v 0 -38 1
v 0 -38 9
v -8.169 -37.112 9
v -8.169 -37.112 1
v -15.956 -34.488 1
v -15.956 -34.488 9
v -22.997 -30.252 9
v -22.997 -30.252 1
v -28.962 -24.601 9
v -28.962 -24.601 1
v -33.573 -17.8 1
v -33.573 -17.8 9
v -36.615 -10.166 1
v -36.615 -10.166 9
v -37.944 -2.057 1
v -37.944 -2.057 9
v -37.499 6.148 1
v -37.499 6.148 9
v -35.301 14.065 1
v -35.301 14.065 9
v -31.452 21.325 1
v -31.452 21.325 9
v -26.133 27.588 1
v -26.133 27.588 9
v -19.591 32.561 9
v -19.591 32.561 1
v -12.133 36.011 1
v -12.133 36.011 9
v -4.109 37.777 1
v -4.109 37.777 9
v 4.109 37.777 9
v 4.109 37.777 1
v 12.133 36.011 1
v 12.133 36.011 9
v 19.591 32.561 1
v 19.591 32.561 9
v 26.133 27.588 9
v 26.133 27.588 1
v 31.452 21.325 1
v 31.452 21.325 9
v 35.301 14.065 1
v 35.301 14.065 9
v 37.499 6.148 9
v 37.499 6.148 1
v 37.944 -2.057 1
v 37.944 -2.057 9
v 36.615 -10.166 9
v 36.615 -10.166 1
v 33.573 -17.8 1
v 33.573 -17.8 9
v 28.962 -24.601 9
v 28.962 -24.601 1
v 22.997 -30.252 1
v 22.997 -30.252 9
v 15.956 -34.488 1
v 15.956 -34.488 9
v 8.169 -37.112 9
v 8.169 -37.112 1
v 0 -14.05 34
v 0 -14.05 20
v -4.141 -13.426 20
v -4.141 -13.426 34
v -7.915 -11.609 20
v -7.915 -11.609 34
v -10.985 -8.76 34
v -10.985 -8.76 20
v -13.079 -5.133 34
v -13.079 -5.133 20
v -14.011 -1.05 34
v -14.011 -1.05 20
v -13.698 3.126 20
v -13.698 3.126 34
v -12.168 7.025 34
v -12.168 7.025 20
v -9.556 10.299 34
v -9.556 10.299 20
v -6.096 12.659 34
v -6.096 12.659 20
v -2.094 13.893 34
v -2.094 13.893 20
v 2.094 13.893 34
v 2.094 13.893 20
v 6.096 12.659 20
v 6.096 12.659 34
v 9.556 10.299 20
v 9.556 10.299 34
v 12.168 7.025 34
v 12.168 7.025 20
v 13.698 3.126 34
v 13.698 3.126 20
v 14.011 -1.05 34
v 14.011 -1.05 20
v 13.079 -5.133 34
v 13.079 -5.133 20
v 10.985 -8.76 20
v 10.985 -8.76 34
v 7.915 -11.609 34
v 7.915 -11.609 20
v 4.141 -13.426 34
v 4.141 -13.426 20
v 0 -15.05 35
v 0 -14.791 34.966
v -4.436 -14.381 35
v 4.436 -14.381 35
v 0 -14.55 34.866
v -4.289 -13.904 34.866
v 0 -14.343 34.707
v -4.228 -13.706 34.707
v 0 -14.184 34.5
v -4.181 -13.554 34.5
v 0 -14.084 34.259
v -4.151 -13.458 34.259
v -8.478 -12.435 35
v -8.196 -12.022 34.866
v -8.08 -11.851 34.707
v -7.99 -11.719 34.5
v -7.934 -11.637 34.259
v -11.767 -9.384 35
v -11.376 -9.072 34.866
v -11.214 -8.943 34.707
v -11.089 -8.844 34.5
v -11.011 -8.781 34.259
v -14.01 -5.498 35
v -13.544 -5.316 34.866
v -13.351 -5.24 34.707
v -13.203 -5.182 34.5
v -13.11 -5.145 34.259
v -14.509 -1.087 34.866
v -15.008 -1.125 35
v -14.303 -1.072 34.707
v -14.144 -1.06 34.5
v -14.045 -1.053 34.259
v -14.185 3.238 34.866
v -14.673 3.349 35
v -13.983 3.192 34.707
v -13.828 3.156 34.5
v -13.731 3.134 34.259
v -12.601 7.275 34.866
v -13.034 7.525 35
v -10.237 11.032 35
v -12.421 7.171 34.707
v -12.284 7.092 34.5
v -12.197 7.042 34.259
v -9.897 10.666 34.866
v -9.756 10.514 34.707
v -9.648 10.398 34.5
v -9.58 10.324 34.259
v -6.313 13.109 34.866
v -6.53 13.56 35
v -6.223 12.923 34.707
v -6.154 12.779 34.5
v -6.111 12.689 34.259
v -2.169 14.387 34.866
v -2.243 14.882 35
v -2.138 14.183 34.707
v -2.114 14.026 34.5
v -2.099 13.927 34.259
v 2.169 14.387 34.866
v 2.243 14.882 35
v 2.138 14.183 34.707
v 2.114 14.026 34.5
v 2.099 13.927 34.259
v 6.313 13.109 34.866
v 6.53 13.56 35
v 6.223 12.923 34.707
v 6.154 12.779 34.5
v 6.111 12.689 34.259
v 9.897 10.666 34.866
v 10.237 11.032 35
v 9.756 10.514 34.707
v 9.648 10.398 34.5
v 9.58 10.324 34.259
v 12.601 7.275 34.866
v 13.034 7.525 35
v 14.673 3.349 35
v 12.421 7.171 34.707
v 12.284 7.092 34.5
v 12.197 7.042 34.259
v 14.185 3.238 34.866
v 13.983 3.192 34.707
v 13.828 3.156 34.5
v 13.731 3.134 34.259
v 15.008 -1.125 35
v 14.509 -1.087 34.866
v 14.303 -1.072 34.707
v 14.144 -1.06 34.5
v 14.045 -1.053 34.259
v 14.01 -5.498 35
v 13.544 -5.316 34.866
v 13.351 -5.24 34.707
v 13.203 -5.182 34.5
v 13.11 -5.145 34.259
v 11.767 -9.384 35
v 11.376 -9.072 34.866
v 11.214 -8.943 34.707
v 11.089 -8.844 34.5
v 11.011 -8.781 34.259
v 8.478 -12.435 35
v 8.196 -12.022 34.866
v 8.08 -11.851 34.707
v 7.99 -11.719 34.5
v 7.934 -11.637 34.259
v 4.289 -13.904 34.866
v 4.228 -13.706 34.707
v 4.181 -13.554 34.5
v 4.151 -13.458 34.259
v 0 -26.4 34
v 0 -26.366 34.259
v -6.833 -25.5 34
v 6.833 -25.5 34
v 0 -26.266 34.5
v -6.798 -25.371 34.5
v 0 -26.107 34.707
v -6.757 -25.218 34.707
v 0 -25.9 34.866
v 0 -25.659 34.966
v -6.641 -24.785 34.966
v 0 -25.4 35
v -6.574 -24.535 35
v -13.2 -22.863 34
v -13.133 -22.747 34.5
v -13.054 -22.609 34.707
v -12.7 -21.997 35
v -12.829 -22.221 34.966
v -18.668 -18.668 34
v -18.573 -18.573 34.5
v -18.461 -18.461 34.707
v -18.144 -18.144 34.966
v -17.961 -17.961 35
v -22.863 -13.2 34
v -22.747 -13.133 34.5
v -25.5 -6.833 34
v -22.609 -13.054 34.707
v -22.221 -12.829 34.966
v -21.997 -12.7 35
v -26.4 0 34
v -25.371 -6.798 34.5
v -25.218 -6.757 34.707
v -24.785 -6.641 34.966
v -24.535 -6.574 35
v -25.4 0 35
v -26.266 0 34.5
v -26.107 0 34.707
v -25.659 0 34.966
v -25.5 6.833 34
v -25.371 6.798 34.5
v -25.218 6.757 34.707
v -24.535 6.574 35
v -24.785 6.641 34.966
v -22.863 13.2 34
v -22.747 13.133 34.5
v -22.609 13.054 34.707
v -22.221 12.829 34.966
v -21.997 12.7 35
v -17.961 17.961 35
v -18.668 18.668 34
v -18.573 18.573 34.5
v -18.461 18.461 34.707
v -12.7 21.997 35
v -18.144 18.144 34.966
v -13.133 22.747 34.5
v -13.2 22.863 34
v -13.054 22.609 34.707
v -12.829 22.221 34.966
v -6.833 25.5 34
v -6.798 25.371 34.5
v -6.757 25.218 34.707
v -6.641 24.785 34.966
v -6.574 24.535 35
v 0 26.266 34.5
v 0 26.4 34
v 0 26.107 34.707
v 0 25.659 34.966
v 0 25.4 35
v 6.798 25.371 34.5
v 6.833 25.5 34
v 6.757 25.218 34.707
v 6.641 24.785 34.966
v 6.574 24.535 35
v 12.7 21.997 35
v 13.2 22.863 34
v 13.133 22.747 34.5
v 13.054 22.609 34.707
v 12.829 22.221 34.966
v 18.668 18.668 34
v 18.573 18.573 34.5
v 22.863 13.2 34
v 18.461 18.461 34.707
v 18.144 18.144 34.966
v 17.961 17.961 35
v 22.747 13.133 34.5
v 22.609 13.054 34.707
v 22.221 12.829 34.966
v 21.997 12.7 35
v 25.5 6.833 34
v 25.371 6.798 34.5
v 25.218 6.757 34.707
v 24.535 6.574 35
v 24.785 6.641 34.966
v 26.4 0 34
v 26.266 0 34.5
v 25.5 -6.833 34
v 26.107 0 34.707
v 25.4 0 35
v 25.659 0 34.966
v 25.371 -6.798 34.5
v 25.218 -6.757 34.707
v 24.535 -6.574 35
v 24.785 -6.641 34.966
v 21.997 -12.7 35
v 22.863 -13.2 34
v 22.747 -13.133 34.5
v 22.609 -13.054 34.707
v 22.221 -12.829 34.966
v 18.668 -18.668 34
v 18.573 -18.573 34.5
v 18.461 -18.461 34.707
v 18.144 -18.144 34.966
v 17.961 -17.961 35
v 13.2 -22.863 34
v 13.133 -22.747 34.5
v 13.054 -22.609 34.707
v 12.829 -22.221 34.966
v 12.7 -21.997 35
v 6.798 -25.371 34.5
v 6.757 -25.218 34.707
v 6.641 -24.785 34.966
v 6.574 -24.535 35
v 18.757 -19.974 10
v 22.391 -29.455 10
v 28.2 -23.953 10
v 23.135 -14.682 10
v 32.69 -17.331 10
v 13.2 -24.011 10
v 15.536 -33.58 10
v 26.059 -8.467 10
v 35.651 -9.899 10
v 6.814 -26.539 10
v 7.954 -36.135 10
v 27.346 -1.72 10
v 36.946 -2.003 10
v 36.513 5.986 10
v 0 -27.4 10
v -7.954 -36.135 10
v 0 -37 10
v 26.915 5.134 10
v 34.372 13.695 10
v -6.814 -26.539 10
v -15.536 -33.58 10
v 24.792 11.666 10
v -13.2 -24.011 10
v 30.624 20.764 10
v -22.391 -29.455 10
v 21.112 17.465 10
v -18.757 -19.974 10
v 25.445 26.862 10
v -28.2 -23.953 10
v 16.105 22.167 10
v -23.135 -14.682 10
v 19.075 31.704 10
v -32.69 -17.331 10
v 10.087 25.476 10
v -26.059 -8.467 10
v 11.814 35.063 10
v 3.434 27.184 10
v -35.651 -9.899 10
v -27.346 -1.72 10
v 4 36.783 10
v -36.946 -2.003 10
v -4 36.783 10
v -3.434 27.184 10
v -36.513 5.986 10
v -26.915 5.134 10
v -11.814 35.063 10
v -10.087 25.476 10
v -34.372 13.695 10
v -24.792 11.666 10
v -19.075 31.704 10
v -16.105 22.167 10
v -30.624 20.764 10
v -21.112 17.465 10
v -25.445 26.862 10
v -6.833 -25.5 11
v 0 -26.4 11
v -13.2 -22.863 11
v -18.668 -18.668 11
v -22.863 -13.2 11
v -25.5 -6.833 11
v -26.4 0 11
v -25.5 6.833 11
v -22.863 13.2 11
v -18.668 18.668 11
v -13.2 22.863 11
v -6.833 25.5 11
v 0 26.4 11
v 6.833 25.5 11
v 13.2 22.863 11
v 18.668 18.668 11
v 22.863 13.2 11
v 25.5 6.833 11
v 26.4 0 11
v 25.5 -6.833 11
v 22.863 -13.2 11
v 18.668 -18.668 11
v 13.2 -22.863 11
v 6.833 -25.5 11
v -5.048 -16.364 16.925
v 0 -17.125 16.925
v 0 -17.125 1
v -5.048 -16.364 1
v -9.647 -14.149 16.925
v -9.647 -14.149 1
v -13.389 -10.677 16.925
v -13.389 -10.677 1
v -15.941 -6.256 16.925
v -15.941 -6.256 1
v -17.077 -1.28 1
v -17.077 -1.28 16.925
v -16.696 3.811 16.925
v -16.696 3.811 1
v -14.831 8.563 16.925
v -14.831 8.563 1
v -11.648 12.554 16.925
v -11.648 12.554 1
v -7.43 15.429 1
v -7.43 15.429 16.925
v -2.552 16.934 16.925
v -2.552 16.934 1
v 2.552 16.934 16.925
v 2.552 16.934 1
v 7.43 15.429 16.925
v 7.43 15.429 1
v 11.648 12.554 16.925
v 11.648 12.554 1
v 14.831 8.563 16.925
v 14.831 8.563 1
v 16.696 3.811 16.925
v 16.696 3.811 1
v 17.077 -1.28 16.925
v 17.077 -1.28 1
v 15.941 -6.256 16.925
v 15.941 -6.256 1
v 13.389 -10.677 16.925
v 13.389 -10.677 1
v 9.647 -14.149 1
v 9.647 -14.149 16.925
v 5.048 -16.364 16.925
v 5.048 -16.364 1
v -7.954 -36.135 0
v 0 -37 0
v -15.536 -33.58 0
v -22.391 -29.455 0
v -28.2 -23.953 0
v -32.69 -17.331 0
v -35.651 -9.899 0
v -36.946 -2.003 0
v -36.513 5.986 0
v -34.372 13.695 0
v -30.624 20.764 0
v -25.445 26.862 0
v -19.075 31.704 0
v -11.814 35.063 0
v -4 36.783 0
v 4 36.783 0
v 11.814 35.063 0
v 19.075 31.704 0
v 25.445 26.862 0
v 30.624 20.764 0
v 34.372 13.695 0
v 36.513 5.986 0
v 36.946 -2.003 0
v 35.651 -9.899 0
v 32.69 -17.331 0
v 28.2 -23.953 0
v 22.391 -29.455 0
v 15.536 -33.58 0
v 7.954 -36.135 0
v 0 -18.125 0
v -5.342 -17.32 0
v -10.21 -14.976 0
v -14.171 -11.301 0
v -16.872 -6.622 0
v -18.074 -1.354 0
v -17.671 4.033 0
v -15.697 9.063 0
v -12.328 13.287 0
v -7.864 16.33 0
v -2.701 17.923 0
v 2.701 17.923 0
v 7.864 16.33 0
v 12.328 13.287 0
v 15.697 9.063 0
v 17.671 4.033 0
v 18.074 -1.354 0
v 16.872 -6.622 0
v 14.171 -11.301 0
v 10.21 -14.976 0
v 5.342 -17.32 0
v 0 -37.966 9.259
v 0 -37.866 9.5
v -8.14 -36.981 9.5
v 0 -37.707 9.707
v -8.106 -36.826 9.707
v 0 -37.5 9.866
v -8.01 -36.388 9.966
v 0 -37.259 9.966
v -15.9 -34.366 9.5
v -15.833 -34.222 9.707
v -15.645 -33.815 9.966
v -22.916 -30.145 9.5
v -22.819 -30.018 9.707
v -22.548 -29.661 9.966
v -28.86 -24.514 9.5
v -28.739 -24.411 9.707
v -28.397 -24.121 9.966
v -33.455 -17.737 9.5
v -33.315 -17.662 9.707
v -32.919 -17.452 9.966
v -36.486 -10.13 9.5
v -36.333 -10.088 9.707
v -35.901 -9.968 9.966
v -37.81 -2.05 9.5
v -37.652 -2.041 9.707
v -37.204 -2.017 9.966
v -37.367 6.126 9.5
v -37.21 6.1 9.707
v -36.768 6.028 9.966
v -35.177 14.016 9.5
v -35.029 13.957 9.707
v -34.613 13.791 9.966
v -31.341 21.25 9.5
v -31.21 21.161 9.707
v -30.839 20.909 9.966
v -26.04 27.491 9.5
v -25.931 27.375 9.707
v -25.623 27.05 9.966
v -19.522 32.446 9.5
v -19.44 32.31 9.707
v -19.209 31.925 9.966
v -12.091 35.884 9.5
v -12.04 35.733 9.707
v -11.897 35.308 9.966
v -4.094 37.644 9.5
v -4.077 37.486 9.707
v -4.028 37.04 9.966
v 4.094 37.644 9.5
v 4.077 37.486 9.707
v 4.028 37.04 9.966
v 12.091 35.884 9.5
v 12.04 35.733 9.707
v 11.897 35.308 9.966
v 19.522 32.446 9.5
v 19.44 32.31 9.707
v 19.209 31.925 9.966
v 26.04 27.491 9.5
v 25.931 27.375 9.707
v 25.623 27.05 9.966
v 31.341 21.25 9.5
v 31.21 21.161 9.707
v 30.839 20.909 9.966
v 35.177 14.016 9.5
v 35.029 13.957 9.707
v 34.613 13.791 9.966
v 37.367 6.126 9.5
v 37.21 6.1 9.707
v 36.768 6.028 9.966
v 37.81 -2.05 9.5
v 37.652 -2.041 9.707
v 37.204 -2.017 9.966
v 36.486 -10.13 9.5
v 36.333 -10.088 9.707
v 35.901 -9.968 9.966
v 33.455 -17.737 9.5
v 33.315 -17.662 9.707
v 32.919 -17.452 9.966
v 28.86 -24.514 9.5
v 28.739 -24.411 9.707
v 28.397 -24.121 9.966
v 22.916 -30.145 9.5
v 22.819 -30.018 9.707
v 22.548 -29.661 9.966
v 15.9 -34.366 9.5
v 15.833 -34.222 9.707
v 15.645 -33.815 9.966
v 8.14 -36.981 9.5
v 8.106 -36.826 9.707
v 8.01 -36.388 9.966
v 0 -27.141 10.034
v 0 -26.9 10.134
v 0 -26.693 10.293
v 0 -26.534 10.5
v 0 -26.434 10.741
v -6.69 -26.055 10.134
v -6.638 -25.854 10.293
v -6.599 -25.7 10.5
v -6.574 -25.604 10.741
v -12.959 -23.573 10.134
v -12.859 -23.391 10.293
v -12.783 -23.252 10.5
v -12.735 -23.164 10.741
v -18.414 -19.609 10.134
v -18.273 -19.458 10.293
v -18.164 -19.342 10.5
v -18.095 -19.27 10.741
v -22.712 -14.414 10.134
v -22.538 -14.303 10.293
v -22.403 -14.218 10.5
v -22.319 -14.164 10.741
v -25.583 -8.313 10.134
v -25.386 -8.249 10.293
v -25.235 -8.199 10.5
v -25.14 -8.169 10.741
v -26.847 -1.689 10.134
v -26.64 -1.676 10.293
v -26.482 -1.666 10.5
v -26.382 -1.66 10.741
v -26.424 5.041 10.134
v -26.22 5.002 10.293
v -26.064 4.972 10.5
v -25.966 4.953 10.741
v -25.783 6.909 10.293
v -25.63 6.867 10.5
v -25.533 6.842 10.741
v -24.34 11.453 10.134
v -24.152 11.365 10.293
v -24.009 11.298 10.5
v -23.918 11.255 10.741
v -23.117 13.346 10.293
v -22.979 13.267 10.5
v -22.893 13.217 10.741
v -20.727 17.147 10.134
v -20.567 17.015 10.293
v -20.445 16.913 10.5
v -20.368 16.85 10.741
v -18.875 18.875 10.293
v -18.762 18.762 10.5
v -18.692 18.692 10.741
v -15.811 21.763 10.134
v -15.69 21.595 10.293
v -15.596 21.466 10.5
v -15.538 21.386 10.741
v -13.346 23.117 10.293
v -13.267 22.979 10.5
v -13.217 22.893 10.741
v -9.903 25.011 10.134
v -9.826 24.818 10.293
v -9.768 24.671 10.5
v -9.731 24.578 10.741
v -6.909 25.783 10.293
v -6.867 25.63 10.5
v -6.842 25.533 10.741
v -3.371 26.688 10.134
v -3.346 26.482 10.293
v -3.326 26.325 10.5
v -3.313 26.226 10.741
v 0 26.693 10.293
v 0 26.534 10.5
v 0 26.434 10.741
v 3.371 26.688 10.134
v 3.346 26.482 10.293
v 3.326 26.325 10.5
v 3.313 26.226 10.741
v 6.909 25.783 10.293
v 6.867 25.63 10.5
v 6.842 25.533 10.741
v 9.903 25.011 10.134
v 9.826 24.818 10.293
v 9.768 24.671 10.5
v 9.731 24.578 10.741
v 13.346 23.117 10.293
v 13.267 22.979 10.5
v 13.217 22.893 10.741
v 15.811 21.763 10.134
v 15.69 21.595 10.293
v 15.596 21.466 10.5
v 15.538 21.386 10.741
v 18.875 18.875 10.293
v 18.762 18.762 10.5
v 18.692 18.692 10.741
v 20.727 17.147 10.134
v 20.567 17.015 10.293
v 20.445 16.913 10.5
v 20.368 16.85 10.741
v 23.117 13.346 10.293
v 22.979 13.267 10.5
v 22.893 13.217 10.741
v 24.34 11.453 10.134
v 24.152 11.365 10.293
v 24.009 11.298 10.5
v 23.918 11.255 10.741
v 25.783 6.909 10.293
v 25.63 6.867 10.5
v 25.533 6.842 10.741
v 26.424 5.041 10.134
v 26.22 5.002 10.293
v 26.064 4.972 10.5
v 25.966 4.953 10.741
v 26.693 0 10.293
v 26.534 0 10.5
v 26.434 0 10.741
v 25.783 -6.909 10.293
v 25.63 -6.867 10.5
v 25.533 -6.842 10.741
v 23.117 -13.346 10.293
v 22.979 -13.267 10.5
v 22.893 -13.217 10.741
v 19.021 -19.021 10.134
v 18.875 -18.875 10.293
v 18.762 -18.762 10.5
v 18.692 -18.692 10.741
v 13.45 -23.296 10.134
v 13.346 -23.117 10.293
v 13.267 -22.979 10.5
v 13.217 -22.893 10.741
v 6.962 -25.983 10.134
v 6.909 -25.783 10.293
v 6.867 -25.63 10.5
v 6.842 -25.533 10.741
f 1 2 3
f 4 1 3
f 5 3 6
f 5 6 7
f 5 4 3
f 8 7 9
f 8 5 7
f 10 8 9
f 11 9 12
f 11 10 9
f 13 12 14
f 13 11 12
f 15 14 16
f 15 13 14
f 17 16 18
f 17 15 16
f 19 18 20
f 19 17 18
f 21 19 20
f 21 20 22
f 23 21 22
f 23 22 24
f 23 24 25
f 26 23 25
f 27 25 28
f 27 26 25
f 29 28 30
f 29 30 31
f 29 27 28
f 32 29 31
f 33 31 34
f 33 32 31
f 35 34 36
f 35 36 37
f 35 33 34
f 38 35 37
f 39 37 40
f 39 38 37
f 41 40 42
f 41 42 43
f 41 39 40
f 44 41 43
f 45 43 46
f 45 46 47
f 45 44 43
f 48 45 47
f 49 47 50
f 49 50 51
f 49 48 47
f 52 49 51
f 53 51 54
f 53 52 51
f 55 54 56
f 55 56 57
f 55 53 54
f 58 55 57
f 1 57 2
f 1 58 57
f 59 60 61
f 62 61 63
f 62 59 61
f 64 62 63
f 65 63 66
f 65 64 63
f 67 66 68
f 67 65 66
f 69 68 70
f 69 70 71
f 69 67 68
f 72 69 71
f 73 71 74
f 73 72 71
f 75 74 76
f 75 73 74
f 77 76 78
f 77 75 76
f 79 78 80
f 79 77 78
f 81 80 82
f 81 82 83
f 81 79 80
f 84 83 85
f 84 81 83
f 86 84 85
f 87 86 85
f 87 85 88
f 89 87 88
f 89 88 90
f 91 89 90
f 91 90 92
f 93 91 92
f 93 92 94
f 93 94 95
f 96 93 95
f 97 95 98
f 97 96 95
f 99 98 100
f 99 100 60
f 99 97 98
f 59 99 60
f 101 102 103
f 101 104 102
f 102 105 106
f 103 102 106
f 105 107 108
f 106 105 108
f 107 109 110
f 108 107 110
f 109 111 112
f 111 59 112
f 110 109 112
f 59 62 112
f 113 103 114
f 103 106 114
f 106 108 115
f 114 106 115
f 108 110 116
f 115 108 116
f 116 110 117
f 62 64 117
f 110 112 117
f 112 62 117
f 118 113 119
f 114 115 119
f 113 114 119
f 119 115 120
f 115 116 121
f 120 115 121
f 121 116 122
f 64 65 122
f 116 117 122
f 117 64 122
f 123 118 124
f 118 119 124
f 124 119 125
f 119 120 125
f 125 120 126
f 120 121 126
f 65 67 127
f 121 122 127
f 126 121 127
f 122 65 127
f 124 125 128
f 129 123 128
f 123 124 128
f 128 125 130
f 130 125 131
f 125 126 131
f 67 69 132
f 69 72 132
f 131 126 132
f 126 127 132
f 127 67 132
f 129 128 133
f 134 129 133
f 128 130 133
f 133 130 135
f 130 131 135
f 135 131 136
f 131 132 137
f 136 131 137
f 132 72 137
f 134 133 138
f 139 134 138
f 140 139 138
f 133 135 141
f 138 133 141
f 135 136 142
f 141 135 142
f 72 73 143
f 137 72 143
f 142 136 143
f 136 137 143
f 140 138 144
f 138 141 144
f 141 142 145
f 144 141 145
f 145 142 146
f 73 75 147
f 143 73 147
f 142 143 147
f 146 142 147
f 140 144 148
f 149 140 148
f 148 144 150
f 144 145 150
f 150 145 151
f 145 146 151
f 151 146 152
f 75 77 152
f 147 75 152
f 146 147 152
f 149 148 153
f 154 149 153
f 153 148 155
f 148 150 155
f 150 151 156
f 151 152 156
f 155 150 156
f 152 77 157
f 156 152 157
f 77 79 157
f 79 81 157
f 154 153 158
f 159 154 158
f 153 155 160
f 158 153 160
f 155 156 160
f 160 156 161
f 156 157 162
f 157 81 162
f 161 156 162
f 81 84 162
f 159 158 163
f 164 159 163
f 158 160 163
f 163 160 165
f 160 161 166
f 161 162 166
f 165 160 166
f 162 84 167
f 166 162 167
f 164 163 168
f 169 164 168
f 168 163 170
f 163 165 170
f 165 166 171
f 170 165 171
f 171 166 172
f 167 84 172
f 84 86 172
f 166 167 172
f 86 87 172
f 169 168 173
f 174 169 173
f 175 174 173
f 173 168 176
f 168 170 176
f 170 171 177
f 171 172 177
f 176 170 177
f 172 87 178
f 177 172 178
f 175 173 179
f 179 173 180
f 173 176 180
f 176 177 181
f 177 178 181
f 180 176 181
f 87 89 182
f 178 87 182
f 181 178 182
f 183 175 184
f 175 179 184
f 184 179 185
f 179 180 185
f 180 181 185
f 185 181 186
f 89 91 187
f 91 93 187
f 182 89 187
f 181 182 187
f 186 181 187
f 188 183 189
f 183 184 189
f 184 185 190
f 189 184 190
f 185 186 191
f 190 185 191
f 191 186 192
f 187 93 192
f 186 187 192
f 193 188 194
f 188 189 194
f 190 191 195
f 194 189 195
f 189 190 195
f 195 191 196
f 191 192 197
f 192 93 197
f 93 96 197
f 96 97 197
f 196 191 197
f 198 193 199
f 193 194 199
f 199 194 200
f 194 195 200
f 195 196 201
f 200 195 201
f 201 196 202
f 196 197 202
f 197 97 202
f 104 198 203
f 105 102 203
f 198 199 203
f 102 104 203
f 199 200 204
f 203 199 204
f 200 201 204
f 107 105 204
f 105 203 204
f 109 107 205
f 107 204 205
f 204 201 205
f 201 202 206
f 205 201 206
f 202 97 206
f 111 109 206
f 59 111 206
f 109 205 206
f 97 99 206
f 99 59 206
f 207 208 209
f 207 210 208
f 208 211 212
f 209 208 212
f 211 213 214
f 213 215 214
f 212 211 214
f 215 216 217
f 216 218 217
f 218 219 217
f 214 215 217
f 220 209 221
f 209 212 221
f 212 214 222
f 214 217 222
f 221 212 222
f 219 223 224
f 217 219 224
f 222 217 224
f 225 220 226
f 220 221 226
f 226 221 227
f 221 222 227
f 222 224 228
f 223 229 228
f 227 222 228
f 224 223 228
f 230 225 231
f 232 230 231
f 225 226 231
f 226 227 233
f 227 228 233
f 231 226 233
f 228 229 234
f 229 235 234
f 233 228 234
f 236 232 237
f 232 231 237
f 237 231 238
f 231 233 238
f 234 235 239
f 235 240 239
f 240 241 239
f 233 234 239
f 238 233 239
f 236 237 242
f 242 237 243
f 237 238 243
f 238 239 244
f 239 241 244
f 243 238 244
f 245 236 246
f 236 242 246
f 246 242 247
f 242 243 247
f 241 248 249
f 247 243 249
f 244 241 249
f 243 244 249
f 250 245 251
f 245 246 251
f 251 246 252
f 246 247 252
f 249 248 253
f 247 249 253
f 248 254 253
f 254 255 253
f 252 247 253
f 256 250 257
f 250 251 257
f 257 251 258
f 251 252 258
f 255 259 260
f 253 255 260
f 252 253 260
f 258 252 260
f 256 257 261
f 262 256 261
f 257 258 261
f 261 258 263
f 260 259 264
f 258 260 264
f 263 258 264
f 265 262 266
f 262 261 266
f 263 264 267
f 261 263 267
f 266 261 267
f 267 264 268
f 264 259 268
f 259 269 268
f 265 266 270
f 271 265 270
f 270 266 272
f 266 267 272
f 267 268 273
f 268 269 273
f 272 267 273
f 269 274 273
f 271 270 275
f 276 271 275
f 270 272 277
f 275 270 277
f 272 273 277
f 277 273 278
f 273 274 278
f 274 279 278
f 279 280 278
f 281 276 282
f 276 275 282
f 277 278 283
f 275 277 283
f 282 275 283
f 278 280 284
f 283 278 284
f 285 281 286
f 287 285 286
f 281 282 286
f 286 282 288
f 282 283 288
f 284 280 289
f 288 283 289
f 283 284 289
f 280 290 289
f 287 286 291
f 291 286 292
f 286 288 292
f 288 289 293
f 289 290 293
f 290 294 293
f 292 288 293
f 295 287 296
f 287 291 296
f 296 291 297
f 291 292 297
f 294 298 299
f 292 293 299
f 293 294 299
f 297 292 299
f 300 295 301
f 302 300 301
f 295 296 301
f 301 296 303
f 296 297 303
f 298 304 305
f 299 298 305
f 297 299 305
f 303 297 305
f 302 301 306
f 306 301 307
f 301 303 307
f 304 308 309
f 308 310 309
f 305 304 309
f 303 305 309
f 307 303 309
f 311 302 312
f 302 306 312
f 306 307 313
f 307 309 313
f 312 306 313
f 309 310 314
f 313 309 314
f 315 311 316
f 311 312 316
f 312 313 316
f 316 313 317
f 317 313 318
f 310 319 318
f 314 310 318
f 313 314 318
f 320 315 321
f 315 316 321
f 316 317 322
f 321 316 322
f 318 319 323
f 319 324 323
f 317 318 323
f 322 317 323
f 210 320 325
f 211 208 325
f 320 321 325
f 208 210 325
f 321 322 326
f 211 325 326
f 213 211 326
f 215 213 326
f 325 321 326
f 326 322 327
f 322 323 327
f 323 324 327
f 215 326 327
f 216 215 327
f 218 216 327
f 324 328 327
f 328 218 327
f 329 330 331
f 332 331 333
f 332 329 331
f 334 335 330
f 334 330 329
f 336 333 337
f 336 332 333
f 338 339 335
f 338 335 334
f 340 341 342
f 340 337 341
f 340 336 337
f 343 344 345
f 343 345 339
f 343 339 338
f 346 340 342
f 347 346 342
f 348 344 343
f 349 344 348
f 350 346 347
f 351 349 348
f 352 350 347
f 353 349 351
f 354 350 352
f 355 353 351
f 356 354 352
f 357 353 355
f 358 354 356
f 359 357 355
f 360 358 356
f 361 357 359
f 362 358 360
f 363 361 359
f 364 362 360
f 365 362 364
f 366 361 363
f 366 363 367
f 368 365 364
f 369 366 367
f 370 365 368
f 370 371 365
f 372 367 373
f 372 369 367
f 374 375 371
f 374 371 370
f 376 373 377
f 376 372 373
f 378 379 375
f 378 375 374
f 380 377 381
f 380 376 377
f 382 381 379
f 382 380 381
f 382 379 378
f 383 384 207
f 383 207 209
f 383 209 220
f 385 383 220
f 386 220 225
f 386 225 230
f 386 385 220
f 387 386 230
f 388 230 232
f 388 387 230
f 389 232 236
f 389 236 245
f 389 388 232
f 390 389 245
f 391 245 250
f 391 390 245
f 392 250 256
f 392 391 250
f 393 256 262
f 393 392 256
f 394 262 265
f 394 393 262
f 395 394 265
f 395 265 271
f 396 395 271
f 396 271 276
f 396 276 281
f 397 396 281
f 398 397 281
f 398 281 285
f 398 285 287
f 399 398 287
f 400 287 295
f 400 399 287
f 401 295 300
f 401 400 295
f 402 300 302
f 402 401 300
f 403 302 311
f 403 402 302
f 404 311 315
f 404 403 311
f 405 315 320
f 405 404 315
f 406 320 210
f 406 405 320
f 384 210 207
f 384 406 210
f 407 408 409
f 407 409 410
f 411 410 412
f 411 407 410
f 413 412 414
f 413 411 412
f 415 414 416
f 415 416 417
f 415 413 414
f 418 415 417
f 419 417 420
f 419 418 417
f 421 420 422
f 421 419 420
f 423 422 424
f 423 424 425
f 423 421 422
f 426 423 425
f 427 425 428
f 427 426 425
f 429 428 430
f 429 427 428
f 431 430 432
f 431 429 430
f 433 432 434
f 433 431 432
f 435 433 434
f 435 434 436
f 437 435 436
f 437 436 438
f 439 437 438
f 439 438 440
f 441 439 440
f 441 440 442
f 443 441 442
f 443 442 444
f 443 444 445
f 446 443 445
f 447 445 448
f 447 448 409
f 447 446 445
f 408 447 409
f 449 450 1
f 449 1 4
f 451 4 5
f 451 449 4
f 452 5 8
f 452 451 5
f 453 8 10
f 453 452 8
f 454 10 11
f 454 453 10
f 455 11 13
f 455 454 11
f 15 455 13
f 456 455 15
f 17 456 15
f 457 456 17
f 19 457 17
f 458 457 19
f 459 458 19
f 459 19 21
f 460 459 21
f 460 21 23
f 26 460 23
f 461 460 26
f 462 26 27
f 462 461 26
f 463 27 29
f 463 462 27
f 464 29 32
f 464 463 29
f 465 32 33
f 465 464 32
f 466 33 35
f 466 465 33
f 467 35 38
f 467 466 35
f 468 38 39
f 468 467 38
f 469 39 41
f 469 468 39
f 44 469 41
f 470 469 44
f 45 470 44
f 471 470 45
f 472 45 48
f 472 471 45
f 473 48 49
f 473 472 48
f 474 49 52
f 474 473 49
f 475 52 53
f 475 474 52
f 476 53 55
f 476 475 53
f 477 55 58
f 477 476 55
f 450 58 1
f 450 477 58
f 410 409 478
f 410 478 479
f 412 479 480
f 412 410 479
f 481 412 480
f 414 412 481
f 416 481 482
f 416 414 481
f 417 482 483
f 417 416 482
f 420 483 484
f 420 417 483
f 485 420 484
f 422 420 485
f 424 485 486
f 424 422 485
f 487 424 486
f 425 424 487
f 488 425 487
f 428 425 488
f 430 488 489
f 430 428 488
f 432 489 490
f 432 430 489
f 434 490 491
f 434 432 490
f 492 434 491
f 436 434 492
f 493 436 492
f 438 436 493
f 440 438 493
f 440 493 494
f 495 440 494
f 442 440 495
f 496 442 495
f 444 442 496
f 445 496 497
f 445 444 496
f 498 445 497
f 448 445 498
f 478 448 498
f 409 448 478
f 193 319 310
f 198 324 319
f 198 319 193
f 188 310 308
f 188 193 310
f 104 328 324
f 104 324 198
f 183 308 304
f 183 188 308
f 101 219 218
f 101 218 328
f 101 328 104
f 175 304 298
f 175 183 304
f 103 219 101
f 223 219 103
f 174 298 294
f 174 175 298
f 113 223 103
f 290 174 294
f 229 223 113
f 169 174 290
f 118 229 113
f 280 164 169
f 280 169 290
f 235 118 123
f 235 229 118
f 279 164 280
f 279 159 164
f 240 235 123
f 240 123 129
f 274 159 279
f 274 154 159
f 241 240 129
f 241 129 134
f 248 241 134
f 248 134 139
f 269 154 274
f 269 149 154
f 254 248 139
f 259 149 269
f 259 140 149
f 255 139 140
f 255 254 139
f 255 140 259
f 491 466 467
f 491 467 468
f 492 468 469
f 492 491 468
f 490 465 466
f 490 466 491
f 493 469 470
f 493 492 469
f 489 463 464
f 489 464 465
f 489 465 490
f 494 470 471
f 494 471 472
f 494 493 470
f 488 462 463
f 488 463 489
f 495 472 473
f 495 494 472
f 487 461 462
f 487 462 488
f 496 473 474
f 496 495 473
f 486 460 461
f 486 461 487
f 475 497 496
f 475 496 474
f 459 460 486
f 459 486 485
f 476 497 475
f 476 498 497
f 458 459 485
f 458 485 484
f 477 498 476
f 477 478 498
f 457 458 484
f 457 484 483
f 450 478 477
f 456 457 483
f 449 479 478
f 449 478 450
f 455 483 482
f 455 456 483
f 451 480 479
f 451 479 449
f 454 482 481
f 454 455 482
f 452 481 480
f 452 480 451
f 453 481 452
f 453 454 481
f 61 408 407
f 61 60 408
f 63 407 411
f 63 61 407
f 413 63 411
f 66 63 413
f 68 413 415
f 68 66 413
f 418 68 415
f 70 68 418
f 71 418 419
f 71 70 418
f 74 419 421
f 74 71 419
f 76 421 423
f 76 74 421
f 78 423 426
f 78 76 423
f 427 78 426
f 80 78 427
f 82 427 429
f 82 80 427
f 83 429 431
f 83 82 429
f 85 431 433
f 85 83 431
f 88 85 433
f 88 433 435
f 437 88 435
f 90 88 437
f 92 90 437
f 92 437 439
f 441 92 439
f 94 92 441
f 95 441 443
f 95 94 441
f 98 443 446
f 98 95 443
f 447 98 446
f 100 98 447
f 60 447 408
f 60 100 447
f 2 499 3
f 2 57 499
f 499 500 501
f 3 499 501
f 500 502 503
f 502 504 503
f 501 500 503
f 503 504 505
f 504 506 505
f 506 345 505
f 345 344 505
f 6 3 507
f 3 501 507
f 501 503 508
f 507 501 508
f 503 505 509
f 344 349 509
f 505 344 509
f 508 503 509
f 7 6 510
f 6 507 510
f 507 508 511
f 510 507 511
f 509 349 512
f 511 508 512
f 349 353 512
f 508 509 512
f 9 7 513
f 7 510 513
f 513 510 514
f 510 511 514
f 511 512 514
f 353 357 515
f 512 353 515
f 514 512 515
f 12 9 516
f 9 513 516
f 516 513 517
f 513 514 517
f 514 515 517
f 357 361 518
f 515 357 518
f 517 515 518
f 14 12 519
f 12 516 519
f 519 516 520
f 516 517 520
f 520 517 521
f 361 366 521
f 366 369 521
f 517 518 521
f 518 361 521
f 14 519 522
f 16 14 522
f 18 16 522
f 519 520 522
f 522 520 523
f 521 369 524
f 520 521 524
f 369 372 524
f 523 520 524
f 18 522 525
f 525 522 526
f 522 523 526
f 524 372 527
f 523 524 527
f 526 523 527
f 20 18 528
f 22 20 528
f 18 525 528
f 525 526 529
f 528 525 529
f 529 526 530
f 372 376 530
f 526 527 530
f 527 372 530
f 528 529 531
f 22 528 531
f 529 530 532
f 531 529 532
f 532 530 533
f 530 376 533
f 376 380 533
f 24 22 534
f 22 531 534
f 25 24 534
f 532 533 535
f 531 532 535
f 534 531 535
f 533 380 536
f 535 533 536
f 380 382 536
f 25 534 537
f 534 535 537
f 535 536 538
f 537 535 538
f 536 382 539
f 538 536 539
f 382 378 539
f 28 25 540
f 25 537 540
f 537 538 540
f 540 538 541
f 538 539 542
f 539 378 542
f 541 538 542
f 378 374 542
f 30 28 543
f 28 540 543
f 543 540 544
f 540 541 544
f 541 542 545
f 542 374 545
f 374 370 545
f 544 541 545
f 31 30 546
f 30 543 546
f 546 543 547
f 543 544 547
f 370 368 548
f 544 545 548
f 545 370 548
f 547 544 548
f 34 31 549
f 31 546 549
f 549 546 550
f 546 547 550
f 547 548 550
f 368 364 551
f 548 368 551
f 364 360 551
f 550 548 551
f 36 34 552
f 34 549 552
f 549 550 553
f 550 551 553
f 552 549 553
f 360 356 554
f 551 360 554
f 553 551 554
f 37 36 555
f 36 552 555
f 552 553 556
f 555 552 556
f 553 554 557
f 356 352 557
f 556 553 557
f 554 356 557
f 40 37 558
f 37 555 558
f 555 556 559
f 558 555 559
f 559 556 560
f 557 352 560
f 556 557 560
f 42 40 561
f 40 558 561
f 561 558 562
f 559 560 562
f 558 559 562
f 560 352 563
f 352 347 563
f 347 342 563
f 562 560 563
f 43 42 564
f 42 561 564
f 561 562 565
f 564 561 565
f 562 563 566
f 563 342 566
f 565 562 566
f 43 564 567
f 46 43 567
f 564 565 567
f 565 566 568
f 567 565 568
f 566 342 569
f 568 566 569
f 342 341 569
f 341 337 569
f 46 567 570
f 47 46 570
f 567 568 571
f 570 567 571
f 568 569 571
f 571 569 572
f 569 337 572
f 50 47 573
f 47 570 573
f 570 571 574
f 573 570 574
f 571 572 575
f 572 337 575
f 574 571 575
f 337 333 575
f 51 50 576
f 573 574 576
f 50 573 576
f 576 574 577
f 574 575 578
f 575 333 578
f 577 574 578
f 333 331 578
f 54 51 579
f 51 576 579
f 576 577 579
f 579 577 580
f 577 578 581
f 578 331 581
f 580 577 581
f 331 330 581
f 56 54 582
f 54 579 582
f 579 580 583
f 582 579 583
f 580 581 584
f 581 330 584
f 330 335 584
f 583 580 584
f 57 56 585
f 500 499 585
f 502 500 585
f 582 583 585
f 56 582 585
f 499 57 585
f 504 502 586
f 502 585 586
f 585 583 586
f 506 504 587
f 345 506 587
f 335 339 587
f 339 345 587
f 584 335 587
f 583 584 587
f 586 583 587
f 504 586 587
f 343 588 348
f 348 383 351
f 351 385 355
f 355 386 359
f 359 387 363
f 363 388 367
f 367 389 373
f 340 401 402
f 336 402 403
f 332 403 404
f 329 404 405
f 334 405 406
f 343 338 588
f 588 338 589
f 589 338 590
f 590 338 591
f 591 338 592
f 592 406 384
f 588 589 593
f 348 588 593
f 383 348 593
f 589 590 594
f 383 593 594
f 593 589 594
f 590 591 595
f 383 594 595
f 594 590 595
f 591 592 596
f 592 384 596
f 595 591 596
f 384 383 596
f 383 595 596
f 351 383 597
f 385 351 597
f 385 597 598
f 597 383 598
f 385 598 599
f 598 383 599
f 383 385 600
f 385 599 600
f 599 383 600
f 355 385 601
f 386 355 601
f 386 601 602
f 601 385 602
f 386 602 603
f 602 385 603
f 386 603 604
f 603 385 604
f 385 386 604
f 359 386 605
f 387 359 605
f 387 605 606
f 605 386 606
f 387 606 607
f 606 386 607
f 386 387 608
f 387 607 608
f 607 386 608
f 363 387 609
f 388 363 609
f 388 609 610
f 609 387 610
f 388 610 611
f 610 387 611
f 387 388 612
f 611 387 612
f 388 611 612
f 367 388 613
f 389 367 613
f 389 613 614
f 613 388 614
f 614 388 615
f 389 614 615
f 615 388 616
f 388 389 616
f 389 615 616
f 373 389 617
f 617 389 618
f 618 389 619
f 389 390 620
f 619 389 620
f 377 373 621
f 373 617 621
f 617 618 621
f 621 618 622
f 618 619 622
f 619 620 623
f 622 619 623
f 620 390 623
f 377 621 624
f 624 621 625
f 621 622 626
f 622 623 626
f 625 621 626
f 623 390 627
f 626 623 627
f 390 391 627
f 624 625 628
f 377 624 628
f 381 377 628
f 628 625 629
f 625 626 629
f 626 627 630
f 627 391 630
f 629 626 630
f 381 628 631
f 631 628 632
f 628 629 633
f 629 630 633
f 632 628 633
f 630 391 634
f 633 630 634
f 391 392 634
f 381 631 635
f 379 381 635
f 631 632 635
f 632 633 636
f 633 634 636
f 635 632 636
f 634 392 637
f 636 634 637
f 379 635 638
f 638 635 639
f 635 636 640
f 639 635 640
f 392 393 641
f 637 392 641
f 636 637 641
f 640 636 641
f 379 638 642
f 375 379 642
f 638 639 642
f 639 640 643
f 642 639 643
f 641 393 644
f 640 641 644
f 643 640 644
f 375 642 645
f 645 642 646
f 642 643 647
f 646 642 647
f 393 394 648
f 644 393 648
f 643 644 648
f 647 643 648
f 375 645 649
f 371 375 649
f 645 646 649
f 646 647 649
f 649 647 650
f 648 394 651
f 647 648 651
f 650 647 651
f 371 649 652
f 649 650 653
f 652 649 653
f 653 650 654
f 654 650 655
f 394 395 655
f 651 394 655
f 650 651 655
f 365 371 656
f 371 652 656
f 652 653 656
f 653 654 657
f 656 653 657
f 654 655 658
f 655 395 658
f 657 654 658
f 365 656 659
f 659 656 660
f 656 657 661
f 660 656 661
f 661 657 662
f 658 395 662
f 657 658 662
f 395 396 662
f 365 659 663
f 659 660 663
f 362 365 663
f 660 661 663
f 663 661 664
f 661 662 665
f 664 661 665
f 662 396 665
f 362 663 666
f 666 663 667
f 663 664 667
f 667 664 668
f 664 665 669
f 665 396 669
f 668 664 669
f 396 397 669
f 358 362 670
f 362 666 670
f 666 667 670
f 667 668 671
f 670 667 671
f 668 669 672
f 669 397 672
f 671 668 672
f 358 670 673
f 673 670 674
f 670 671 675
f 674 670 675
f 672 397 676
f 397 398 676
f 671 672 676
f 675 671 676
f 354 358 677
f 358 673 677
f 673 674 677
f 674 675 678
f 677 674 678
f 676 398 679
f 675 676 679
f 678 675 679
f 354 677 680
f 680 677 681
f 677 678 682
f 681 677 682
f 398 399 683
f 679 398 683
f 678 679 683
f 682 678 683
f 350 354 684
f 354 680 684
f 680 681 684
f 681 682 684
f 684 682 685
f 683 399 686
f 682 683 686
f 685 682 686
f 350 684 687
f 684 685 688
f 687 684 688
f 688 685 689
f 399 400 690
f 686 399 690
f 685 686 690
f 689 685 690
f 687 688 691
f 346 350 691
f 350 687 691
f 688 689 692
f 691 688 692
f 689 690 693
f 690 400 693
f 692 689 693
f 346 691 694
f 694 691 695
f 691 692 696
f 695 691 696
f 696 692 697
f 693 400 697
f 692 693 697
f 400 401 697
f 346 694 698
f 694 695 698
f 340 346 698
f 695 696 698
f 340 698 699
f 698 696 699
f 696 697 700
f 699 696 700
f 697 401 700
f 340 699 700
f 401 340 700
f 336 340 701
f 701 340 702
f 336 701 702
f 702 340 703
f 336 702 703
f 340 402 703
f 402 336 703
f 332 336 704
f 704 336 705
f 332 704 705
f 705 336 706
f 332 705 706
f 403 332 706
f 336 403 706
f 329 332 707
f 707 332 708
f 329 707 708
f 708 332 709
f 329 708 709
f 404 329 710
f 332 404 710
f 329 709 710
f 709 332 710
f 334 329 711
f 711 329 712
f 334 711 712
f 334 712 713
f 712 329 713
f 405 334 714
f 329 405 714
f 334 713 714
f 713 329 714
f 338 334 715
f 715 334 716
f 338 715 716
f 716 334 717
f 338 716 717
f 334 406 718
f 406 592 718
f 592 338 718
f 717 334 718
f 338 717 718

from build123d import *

# Parameters (mm, degrees)
F2_SIZE = 1
F3_R    = 1


with BuildPart() as f1:
    # F0 (on Right) → F1 (revolve)
    with BuildSketch(Plane.YZ):
        Polygon((-38, 10), (-38, 0), (-17.125, 0), (-17.125, 16.925), (-14.05, 20), (-14.05, 35), (-26.4, 35), (-26.4, 10), align=None)
    revolve(axis=Axis((0, 0, 24.570201), (0, 0, -1)))

    # F2
    f2_edges = [f1.edges().sort_by_distance(p)[0] for p in [
        (0, 38, 0),
        (0, 17.125, 0),
    ]]
    chamfer(f2_edges, length=F2_SIZE)

    # F3
    f3_edges = [f1.edges().sort_by_distance(p)[0] for p in [
        (0, 14.05, 35),
        (0, 26.4, 35),
        (0, 38, 10),
        (0, 26.4, 10),
    ]]
    fillet(f3_edges, radius=F3_R)


solid = f1.part
